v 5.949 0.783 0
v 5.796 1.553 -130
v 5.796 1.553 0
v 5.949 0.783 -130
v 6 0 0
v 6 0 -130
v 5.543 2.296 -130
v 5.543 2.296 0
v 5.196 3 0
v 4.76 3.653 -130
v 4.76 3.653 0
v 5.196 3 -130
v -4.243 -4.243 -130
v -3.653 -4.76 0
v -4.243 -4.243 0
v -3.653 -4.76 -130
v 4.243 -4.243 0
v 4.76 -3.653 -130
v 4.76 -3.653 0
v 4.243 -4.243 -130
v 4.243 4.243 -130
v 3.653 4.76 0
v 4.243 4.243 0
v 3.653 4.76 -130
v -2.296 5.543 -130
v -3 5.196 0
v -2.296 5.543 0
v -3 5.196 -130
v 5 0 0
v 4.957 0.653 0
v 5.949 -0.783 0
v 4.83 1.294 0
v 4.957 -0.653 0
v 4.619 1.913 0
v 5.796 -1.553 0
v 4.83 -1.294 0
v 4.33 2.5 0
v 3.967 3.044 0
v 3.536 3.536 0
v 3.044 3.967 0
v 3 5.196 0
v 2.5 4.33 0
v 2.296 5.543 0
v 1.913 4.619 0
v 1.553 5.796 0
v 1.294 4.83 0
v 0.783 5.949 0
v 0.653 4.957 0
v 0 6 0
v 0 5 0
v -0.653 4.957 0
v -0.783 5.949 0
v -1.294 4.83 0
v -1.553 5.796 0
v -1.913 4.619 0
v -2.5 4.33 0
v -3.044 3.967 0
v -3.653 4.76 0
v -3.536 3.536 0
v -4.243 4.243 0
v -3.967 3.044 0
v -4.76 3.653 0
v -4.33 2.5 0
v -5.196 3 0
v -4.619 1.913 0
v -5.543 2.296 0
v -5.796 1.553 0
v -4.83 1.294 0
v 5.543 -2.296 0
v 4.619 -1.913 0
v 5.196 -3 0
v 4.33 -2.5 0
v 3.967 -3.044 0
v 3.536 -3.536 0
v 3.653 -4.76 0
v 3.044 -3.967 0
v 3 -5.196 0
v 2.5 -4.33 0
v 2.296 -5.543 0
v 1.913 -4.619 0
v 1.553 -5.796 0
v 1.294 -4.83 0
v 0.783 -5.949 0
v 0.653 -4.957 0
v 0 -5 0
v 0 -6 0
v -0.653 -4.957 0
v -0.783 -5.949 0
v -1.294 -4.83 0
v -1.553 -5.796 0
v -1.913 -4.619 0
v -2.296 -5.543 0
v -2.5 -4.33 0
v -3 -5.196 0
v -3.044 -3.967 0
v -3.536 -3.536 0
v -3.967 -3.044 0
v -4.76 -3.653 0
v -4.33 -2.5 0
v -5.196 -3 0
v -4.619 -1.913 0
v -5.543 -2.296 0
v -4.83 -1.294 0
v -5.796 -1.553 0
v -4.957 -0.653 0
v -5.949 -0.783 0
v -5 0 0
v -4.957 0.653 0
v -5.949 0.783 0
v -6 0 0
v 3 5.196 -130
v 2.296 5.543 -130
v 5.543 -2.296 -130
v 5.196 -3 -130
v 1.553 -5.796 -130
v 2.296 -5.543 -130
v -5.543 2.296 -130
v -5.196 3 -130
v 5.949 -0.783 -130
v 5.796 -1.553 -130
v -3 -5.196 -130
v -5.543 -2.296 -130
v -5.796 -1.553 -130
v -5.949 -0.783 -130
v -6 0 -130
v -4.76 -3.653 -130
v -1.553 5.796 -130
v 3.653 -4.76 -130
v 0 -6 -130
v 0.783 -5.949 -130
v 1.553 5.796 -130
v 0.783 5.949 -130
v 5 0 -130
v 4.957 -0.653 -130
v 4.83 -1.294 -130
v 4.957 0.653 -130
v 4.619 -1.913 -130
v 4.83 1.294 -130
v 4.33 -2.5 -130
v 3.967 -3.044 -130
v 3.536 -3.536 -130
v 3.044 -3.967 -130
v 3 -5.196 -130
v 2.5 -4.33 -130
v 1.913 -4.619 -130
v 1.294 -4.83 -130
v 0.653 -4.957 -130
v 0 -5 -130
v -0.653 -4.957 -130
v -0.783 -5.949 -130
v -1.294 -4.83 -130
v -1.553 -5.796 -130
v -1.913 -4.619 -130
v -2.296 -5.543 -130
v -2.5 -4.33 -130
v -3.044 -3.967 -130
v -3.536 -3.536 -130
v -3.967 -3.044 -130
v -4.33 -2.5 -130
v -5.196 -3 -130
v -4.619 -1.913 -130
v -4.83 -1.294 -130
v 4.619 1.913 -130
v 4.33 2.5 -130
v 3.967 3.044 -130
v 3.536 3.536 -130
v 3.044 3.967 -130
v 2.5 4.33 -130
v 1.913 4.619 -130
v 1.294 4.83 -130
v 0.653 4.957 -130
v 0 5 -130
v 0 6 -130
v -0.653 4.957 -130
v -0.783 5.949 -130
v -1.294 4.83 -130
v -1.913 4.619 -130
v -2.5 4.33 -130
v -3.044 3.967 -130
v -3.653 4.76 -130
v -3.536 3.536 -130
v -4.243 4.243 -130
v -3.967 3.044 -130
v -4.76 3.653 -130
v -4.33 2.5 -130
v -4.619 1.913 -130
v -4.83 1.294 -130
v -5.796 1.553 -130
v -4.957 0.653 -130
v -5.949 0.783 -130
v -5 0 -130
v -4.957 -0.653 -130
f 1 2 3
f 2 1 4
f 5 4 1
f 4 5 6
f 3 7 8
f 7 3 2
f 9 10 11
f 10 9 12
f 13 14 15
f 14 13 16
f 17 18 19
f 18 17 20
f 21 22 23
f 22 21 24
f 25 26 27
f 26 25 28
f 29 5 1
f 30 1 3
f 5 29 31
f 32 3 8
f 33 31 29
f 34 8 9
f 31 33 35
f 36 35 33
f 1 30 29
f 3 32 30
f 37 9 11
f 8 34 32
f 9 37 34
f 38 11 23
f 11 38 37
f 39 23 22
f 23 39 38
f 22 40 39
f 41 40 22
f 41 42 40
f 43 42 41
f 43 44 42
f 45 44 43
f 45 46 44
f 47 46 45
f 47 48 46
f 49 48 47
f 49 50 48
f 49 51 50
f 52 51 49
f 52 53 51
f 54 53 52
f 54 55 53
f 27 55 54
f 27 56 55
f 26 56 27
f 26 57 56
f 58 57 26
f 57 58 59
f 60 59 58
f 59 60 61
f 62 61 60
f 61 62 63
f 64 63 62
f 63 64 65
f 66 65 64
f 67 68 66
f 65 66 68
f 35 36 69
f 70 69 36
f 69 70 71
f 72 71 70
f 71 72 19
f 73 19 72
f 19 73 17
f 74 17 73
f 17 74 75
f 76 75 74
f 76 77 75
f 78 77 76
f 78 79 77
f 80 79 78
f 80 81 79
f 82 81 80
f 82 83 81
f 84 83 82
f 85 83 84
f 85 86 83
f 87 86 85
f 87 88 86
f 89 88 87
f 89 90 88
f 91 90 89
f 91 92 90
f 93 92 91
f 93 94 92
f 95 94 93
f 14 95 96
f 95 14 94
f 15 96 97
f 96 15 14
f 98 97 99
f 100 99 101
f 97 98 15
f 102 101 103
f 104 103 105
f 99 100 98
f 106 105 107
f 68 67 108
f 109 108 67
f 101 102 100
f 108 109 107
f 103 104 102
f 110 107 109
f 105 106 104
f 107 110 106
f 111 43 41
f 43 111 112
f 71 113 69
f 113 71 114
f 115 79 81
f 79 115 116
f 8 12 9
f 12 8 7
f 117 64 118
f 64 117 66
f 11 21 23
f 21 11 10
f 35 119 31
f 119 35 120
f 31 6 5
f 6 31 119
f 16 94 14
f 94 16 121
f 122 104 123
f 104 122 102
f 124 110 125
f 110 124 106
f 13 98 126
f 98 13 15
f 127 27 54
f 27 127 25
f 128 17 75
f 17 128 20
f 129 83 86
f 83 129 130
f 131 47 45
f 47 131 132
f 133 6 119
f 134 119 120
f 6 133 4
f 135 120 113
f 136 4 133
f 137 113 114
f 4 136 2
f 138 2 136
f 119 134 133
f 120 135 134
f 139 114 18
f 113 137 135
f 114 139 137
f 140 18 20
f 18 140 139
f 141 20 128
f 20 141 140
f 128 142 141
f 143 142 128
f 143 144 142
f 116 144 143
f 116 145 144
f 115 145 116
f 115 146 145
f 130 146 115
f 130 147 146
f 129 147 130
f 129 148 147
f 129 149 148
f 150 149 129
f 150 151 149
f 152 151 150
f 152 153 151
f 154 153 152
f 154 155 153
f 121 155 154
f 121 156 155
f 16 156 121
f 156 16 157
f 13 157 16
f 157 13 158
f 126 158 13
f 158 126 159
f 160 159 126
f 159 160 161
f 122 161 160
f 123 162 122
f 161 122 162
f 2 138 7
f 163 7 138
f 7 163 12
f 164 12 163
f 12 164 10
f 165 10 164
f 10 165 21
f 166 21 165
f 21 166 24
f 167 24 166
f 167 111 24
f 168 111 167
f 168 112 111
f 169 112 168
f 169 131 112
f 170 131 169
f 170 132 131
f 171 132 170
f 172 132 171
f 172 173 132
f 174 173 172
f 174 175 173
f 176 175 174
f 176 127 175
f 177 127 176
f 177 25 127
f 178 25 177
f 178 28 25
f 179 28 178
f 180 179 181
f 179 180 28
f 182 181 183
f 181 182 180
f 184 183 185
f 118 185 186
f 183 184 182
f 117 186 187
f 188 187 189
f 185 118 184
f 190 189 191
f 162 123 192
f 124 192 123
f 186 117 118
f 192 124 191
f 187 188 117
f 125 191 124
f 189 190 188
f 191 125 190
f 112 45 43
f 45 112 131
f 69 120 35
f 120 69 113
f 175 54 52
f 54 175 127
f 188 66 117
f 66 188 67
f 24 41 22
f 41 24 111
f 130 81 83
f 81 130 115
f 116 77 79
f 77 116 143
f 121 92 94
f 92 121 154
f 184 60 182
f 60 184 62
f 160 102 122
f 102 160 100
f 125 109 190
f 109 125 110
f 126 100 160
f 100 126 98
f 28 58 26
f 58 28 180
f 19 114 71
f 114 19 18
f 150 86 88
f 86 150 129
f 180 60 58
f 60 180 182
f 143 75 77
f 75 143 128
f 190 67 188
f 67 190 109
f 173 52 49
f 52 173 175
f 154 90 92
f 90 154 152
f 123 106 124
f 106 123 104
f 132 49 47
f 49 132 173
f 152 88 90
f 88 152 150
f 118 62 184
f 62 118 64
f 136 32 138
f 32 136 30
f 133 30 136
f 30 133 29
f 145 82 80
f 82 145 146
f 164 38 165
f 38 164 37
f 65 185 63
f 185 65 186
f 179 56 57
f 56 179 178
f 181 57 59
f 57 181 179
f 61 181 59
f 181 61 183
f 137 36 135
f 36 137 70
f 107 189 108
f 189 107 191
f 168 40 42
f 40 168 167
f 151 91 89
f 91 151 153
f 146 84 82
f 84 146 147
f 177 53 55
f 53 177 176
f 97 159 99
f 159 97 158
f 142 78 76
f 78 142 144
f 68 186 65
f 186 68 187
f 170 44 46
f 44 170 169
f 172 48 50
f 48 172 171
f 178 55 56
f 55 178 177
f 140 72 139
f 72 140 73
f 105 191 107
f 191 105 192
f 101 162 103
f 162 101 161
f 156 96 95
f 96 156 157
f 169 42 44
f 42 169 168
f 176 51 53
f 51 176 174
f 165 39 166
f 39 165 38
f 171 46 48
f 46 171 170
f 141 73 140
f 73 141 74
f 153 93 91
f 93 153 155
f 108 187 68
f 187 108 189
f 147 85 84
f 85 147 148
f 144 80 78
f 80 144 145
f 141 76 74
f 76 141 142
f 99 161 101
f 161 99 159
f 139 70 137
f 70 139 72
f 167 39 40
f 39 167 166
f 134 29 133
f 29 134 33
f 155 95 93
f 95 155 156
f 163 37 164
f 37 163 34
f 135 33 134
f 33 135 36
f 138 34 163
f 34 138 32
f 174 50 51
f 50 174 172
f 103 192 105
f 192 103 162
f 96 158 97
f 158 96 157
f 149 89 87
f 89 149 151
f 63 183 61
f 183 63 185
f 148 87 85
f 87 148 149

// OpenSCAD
// file: ../common/ds_lib.scad
// DronSwarm · librería común de piezas del frame (S07-S08). Unidades: mm.
//
// Reglas (ADR-003): sin hull()/minkowski()/offset() — FreeCAD los convierte en malla y el STEP deja de ser un
// sólido válido. Las formas redondeadas se arman con uniones de cubos y cilindros. El importador CSG de FreeCAD
// también falla con booleanas 2D y con varios operandos agrupados bajo una sola transformación: cada grupo de
// agujeros debe ser hijo directo del difference(), con su propio translate.
//
// Interfaz de motor DronSwarm (DMI, ADR-011): placa con 4 ranuras radiales a 90°, de modo que el mismo soporte
// acepta varios patrones comerciales y, más adelante, el motor propio (S17+) se diseña para caer en el mismo rango.
//   DMI-S: 4×M3, círculo de tornillos Ø16-Ø25 (motores 28xx-41xx, ≤ 600 W)
//   DMI-L: 4×M4, círculo de tornillos Ø30-Ø42 (motores 50xx-70xx, ≤ 2 kW)

$fn = 48;

M3 = 3.3; M3_HEAD = 6.0; M3_NUT = 6.4;     // pasante, cabeza, tuerca (entre caras + juego)
M4 = 4.4; M4_HEAD = 7.5;
M5 = 5.4;

function dmi_bolt(iface) = iface == "L" ? M4 : M3;
function dmi_r(iface) = iface == "L" ? [15, 21] : [8, 12.5];   // radio mínimo y máximo de las ranuras
function dmi_plate_d(iface) = iface == "L" ? 56 : 36;
function dmi_center(iface) = iface == "L" ? 16 : 10;            // eje, seguro y paso de cables

// Rectángulo con esquinas redondeadas (2D) y su extrusión
module rrect2d(size, r) {
    r2 = min(r, size[0] / 2 - 0.01, size[1] / 2 - 0.01);
    union() {
        translate([r2, 0]) square([size[0] - 2 * r2, size[1]]);
        translate([0, r2]) square([size[0], size[1] - 2 * r2]);
        for (x = [r2, size[0] - r2], y = [r2, size[1] - r2]) translate([x, y]) circle(r = r2);
    }
}
// Caja redondeada con primitivas 3D (sin booleanas 2D: el importador CSG de FreeCAD falla con ellas)
module rbox(size, r) {
    r2 = min(r, size[0] / 2 - 0.01, size[1] / 2 - 0.01);
    union() {
        translate([r2, 0, 0]) cube([size[0] - 2 * r2, size[1], size[2]]);
        translate([0, r2, 0]) cube([size[0], size[1] - 2 * r2, size[2]]);
        for (x = [r2, size[0] - r2], y = [r2, size[1] - r2]) translate([x, y, 0]) cylinder(r = r2, h = size[2]);
    }
}
module crbox(size, r) { translate([-size[0] / 2, -size[1] / 2, 0]) rbox(size, r); }   // centrado en x/y

// Ranura (2D) entre dos puntos sobre el eje x
module slot2d(r0, r1, w) {
    union() {
        translate([r0, -w / 2]) square([r1 - r0, w]);
        translate([r0, 0]) circle(d = w);
        translate([r1, 0]) circle(d = w);
    }
}

// Agujeros de la interfaz de motor (para restar de una placa de espesor t)
module slot3d(r0, r1, w, h) {
    union() {
        translate([r0, -w / 2, 0]) cube([r1 - r0, w, h]);
        translate([r0, 0, 0]) cylinder(d = w, h = h);
        translate([r1, 0, 0]) cylinder(d = w, h = h);
    }
}
module dmi_holes(iface, t) {
    r = dmi_r(iface);
    translate([0, 0, -1]) union() {
        cylinder(d = dmi_center(iface), h = t + 2);
        for (a = [45, 135, 225, 315]) rotate(a) slot3d(r[0], r[1], dmi_bolt(iface), t + 2);
    }
}

// Soporte de motor en la punta del brazo: manguito sobre el tubo + placa DMI arriba
//   el tubo entra por -x; la placa queda centrada en el eje del motor (origen), cara superior en z = 0
module motor_mount(tube_d, iface = "S", sleeve = 34, wall = 3.5) {
    od = tube_d + 2 * wall;
    pd = dmi_plate_d(iface);
    pt = iface == "L" ? 6 : 4;
    zc = -pt - tube_d / 2 - 1;                 // eje del tubo bajo la placa
    difference() {
        union() {
            translate([0, 0, -pt]) cylinder(d = pd, h = pt);                         // placa DMI
            translate([-sleeve - pd / 2 + 6, 0, zc]) rotate([0, 90, 0])
                cylinder(d = od, h = sleeve + pd / 2 - 6 + 4);                       // manguito
            translate([-sleeve - pd / 2 + 6, -od / 2, zc]) cube([sleeve + pd / 2 - 2, od, -zc - pt + 0.01]);  // alma
            translate([-sleeve - pd / 2 + 6, -5, zc - od / 2 - 7]) cube([sleeve, 10, 8]);   // oreja de apriete
        }
        dmi_holes(iface, pt + 0.02, $fn = 32);
        translate([-sleeve - pd / 2 + 5, 0, zc]) rotate([0, 90, 0]) cylinder(d = tube_d + 0.3, h = sleeve + pd / 2 - 3); // tubo
        translate([-sleeve - pd / 2 + 4, -1, zc - od / 2 - 8]) cube([sleeve + 1, 2, od / 2 + 6]);   // ranura de apriete
        for (x = [0.3, 0.75]) translate([-sleeve - pd / 2 + 6 + x * sleeve, 0, zc - od / 2 - 3])
            rotate([90, 0, 0]) cylinder(d = M3, h = 30, center = true);                // tornillos de apriete
        translate([-pd / 2 - 2, 0, zc]) rotate([0, 90, 0]) cylinder(d = 7, h = pd);   // salida de cables del tubo
    }
}

// Bloque de brazo entre las dos placas centrales (impreso PA12-CF): sujeta el tubo y separa las placas.
//   el tubo sale por +x desde el origen; el bloque ocupa x ∈ [-len, 0], altura = gap
module arm_block(tube_d, gap, len = 40, width = 0, bolt = M3) {
    w = width > 0 ? width : tube_d + 14;
    difference() {
        translate([-len, -w / 2, 0]) rbox([len, w, gap], 2);
        translate([-len - 1, 0, gap / 2]) rotate([0, 90, 0]) cylinder(d = tube_d + 0.2, h = len + 2);   // tubo
        translate([-len - 1, -0.75, gap / 2]) cube([len + 2, 1.5, gap / 2 + 1]);                        // ranura de apriete
        for (p = arm_block_bolts(tube_d, len, w)) translate([p[0], p[1], -1]) cylinder(d = bolt, h = gap + 2);
        translate([-len * 0.5, 0, gap * 0.78]) rotate([90, 0, 0]) cylinder(d = M3, h = w + 2, center = true);  // apriete
    }
}
function arm_block_bolts(tube_d, len, w) =
    [for (x = [-len + 6, -6], y = [-(w / 2 - 3.6), w / 2 - 3.6]) [x, y]];

// Patrón de controladora de vuelo (agujeros M3 en cuadrado)
module fc_holes(pattern, t) {
    for (x = [-1, 1], y = [-1, 1]) translate([x * pattern / 2, y * pattern / 2, -1]) cylinder(d = M3, h = t + 2);
}
// file: ds_i_params.scad
// DS-I · parámetros generados por tools/cad/gen_cad_params.py el 2026-10-19
// desde engineering/data/results (spec v1). No editar a mano: regenerar. Unidades: mm, kg.

vehicle = "DS-I";
rotors = 4;
wheelbase = 672;
arm_radius = 336;
prop_d = 431.8;
tube_od = 20;
tube_wall = 1;
arm_len = 252;
plate_d = 168;
plate_t = 3;
plate_gap = 26;
motor_iface = "S";
battery_dims = [134.4, 76.2, 48.8];
battery = "6S2P 50S";
leg_h = 160;
fold_arms = false;
mtow_kg = 2.695;
motor_mass_kg = 0.074;
fc_pattern = 30.5;
gimbal_box = [90, 70, 105];
gimbal_damper_pitch = [60, 50];
// file: ds_i_frame.scad
// DS-I · geometría compartida del frame: posiciones derivadas de los parámetros (spec v1). Unidades: mm.
// Ejes: x adelante, y izquierda, z arriba. z = 0 es la cara superior de la placa inferior.
// Cada pieza vive en su propio archivo (center_plate.scad, arm_block.scad, …) e incluye este.

include <ds_i_params.scad>
use <../common/ds_lib.scad>
include <../common/ds_lib.scad>

arm_angles = [45, 135, 225, 315];         // quad X
block_len = 40;
block_w = tube_od + 14;
r_block_out = plate_d / 2 - 3;            // extremo exterior del bloque de brazo
tube_z = plate_gap / 2;                   // eje de los tubos
tube_len = arm_radius - r_block_out + block_len - 8;   // dentro del bloque hasta el soporte de motor
leg_offset = 70;                          // patas abrazadas al brazo, a esta distancia del bloque
leg_r = r_block_out + leg_offset;
leg_tube = 12;                            // tubo de las patas Ø12×1
battery_pos = [-28, 0];                   // batería transversal, atrás, bajo la placa
gimbal_pos = [62, 0];                     // cámara adelante, colgada con amortiguadores
housing_size = [120, 90, 58];             // carcasa IP54 sobre la placa superior
housing_pos = [0, 0];

// Contorno de las placas centrales (2D): círculo con lóbulos bajo cada bloque de brazo
module plate_outline() {
    union() {
        circle(d = plate_d, $fn = 96);
        for (a = arm_angles) rotate(a) translate([r_block_out - block_len - 4, -block_w / 2 - 4]) square([block_len + 7, block_w + 8]);
    }
}

// Agujeros comunes a ambas placas: tornillos de los bloques
module plate_common_holes() {
    for (a = arm_angles) rotate(a) translate([r_block_out, 0])
        for (p = arm_block_bolts(tube_od, block_len, block_w)) translate(p) circle(d = M3);
}

// Posiciones de piezas montadas en las placas
gimbal_mount_bolts = [for (x = [-25, 25], y = [-32, 32]) [gimbal_pos[0] - 15 + x, y]];   // adaptador bajo la placa
battery_tray_bolts = [for (x = [-30, 30], y = [-46, 46]) [battery_pos[0] + x, y]];
housing_flange = 10;
// tornillos de la brida a 6 mm de la pared (afuera del canal de la junta, que va de 0.6 a 2.6 mm)
housing_bolts = [[66, 0], [-66, 0], [0, 51], [0, -51], [40, 51], [40, -51], [-40, 51], [-40, -51]];
cable_gland_pos = [-housing_size[0] / 2 + 18, 0];      // paso de cables al interior de la carcasa (prensaestopa M12)
motor_d = motor_iface == "L" ? 62 : 38;   // motor de referencia (COTS, se confirma en S09)
motor_h = motor_iface == "L" ? 36 : 26;
tray_t = 3;                               // bandeja de batería
gm_t = 4;                                 // placas del adaptador de cámara
damper_h = 10;                            // amortiguadores de silicona
foot_h = 45;                              // pie amortiguador de TPU (≈ 30 mm de carrera)
foot_stroke = 30;
// Altura de las patas por condición de diseño: con el pie comprimido, la cámara no toca el suelo (10 mm de margen)
gimbal_bottom_z = -plate_t - 2 * gm_t - damper_h - gimbal_box[2];
ground_z = gimbal_bottom_z - foot_stroke - 10;
leg_top_z = tube_z - (tube_od + 8) / 2 - 2;     // tope del tubo de la pata dentro de la abrazadera
leg_len = (leg_top_z - ground_z) - (foot_h - 12);
mm_sleeve = 26;                           // manguito del soporte de motor (FEA: FS 37 con 34 mm, se acorta)
// main file
// DS-I · pata: tubo de carbono Ø12×1 (compra, ×4). Local: eje z, desde z = 0 hacia abajo.
include <ds_i_frame.scad>
module leg_tube() translate([0, 0, -leg_len]) difference() {
    cylinder(d = leg_tube, h = leg_len, $fn = 48);
    translate([0, 0, -1]) cylinder(d = leg_tube - 2, h = leg_len + 2, $fn = 48);
}
leg_tube();
